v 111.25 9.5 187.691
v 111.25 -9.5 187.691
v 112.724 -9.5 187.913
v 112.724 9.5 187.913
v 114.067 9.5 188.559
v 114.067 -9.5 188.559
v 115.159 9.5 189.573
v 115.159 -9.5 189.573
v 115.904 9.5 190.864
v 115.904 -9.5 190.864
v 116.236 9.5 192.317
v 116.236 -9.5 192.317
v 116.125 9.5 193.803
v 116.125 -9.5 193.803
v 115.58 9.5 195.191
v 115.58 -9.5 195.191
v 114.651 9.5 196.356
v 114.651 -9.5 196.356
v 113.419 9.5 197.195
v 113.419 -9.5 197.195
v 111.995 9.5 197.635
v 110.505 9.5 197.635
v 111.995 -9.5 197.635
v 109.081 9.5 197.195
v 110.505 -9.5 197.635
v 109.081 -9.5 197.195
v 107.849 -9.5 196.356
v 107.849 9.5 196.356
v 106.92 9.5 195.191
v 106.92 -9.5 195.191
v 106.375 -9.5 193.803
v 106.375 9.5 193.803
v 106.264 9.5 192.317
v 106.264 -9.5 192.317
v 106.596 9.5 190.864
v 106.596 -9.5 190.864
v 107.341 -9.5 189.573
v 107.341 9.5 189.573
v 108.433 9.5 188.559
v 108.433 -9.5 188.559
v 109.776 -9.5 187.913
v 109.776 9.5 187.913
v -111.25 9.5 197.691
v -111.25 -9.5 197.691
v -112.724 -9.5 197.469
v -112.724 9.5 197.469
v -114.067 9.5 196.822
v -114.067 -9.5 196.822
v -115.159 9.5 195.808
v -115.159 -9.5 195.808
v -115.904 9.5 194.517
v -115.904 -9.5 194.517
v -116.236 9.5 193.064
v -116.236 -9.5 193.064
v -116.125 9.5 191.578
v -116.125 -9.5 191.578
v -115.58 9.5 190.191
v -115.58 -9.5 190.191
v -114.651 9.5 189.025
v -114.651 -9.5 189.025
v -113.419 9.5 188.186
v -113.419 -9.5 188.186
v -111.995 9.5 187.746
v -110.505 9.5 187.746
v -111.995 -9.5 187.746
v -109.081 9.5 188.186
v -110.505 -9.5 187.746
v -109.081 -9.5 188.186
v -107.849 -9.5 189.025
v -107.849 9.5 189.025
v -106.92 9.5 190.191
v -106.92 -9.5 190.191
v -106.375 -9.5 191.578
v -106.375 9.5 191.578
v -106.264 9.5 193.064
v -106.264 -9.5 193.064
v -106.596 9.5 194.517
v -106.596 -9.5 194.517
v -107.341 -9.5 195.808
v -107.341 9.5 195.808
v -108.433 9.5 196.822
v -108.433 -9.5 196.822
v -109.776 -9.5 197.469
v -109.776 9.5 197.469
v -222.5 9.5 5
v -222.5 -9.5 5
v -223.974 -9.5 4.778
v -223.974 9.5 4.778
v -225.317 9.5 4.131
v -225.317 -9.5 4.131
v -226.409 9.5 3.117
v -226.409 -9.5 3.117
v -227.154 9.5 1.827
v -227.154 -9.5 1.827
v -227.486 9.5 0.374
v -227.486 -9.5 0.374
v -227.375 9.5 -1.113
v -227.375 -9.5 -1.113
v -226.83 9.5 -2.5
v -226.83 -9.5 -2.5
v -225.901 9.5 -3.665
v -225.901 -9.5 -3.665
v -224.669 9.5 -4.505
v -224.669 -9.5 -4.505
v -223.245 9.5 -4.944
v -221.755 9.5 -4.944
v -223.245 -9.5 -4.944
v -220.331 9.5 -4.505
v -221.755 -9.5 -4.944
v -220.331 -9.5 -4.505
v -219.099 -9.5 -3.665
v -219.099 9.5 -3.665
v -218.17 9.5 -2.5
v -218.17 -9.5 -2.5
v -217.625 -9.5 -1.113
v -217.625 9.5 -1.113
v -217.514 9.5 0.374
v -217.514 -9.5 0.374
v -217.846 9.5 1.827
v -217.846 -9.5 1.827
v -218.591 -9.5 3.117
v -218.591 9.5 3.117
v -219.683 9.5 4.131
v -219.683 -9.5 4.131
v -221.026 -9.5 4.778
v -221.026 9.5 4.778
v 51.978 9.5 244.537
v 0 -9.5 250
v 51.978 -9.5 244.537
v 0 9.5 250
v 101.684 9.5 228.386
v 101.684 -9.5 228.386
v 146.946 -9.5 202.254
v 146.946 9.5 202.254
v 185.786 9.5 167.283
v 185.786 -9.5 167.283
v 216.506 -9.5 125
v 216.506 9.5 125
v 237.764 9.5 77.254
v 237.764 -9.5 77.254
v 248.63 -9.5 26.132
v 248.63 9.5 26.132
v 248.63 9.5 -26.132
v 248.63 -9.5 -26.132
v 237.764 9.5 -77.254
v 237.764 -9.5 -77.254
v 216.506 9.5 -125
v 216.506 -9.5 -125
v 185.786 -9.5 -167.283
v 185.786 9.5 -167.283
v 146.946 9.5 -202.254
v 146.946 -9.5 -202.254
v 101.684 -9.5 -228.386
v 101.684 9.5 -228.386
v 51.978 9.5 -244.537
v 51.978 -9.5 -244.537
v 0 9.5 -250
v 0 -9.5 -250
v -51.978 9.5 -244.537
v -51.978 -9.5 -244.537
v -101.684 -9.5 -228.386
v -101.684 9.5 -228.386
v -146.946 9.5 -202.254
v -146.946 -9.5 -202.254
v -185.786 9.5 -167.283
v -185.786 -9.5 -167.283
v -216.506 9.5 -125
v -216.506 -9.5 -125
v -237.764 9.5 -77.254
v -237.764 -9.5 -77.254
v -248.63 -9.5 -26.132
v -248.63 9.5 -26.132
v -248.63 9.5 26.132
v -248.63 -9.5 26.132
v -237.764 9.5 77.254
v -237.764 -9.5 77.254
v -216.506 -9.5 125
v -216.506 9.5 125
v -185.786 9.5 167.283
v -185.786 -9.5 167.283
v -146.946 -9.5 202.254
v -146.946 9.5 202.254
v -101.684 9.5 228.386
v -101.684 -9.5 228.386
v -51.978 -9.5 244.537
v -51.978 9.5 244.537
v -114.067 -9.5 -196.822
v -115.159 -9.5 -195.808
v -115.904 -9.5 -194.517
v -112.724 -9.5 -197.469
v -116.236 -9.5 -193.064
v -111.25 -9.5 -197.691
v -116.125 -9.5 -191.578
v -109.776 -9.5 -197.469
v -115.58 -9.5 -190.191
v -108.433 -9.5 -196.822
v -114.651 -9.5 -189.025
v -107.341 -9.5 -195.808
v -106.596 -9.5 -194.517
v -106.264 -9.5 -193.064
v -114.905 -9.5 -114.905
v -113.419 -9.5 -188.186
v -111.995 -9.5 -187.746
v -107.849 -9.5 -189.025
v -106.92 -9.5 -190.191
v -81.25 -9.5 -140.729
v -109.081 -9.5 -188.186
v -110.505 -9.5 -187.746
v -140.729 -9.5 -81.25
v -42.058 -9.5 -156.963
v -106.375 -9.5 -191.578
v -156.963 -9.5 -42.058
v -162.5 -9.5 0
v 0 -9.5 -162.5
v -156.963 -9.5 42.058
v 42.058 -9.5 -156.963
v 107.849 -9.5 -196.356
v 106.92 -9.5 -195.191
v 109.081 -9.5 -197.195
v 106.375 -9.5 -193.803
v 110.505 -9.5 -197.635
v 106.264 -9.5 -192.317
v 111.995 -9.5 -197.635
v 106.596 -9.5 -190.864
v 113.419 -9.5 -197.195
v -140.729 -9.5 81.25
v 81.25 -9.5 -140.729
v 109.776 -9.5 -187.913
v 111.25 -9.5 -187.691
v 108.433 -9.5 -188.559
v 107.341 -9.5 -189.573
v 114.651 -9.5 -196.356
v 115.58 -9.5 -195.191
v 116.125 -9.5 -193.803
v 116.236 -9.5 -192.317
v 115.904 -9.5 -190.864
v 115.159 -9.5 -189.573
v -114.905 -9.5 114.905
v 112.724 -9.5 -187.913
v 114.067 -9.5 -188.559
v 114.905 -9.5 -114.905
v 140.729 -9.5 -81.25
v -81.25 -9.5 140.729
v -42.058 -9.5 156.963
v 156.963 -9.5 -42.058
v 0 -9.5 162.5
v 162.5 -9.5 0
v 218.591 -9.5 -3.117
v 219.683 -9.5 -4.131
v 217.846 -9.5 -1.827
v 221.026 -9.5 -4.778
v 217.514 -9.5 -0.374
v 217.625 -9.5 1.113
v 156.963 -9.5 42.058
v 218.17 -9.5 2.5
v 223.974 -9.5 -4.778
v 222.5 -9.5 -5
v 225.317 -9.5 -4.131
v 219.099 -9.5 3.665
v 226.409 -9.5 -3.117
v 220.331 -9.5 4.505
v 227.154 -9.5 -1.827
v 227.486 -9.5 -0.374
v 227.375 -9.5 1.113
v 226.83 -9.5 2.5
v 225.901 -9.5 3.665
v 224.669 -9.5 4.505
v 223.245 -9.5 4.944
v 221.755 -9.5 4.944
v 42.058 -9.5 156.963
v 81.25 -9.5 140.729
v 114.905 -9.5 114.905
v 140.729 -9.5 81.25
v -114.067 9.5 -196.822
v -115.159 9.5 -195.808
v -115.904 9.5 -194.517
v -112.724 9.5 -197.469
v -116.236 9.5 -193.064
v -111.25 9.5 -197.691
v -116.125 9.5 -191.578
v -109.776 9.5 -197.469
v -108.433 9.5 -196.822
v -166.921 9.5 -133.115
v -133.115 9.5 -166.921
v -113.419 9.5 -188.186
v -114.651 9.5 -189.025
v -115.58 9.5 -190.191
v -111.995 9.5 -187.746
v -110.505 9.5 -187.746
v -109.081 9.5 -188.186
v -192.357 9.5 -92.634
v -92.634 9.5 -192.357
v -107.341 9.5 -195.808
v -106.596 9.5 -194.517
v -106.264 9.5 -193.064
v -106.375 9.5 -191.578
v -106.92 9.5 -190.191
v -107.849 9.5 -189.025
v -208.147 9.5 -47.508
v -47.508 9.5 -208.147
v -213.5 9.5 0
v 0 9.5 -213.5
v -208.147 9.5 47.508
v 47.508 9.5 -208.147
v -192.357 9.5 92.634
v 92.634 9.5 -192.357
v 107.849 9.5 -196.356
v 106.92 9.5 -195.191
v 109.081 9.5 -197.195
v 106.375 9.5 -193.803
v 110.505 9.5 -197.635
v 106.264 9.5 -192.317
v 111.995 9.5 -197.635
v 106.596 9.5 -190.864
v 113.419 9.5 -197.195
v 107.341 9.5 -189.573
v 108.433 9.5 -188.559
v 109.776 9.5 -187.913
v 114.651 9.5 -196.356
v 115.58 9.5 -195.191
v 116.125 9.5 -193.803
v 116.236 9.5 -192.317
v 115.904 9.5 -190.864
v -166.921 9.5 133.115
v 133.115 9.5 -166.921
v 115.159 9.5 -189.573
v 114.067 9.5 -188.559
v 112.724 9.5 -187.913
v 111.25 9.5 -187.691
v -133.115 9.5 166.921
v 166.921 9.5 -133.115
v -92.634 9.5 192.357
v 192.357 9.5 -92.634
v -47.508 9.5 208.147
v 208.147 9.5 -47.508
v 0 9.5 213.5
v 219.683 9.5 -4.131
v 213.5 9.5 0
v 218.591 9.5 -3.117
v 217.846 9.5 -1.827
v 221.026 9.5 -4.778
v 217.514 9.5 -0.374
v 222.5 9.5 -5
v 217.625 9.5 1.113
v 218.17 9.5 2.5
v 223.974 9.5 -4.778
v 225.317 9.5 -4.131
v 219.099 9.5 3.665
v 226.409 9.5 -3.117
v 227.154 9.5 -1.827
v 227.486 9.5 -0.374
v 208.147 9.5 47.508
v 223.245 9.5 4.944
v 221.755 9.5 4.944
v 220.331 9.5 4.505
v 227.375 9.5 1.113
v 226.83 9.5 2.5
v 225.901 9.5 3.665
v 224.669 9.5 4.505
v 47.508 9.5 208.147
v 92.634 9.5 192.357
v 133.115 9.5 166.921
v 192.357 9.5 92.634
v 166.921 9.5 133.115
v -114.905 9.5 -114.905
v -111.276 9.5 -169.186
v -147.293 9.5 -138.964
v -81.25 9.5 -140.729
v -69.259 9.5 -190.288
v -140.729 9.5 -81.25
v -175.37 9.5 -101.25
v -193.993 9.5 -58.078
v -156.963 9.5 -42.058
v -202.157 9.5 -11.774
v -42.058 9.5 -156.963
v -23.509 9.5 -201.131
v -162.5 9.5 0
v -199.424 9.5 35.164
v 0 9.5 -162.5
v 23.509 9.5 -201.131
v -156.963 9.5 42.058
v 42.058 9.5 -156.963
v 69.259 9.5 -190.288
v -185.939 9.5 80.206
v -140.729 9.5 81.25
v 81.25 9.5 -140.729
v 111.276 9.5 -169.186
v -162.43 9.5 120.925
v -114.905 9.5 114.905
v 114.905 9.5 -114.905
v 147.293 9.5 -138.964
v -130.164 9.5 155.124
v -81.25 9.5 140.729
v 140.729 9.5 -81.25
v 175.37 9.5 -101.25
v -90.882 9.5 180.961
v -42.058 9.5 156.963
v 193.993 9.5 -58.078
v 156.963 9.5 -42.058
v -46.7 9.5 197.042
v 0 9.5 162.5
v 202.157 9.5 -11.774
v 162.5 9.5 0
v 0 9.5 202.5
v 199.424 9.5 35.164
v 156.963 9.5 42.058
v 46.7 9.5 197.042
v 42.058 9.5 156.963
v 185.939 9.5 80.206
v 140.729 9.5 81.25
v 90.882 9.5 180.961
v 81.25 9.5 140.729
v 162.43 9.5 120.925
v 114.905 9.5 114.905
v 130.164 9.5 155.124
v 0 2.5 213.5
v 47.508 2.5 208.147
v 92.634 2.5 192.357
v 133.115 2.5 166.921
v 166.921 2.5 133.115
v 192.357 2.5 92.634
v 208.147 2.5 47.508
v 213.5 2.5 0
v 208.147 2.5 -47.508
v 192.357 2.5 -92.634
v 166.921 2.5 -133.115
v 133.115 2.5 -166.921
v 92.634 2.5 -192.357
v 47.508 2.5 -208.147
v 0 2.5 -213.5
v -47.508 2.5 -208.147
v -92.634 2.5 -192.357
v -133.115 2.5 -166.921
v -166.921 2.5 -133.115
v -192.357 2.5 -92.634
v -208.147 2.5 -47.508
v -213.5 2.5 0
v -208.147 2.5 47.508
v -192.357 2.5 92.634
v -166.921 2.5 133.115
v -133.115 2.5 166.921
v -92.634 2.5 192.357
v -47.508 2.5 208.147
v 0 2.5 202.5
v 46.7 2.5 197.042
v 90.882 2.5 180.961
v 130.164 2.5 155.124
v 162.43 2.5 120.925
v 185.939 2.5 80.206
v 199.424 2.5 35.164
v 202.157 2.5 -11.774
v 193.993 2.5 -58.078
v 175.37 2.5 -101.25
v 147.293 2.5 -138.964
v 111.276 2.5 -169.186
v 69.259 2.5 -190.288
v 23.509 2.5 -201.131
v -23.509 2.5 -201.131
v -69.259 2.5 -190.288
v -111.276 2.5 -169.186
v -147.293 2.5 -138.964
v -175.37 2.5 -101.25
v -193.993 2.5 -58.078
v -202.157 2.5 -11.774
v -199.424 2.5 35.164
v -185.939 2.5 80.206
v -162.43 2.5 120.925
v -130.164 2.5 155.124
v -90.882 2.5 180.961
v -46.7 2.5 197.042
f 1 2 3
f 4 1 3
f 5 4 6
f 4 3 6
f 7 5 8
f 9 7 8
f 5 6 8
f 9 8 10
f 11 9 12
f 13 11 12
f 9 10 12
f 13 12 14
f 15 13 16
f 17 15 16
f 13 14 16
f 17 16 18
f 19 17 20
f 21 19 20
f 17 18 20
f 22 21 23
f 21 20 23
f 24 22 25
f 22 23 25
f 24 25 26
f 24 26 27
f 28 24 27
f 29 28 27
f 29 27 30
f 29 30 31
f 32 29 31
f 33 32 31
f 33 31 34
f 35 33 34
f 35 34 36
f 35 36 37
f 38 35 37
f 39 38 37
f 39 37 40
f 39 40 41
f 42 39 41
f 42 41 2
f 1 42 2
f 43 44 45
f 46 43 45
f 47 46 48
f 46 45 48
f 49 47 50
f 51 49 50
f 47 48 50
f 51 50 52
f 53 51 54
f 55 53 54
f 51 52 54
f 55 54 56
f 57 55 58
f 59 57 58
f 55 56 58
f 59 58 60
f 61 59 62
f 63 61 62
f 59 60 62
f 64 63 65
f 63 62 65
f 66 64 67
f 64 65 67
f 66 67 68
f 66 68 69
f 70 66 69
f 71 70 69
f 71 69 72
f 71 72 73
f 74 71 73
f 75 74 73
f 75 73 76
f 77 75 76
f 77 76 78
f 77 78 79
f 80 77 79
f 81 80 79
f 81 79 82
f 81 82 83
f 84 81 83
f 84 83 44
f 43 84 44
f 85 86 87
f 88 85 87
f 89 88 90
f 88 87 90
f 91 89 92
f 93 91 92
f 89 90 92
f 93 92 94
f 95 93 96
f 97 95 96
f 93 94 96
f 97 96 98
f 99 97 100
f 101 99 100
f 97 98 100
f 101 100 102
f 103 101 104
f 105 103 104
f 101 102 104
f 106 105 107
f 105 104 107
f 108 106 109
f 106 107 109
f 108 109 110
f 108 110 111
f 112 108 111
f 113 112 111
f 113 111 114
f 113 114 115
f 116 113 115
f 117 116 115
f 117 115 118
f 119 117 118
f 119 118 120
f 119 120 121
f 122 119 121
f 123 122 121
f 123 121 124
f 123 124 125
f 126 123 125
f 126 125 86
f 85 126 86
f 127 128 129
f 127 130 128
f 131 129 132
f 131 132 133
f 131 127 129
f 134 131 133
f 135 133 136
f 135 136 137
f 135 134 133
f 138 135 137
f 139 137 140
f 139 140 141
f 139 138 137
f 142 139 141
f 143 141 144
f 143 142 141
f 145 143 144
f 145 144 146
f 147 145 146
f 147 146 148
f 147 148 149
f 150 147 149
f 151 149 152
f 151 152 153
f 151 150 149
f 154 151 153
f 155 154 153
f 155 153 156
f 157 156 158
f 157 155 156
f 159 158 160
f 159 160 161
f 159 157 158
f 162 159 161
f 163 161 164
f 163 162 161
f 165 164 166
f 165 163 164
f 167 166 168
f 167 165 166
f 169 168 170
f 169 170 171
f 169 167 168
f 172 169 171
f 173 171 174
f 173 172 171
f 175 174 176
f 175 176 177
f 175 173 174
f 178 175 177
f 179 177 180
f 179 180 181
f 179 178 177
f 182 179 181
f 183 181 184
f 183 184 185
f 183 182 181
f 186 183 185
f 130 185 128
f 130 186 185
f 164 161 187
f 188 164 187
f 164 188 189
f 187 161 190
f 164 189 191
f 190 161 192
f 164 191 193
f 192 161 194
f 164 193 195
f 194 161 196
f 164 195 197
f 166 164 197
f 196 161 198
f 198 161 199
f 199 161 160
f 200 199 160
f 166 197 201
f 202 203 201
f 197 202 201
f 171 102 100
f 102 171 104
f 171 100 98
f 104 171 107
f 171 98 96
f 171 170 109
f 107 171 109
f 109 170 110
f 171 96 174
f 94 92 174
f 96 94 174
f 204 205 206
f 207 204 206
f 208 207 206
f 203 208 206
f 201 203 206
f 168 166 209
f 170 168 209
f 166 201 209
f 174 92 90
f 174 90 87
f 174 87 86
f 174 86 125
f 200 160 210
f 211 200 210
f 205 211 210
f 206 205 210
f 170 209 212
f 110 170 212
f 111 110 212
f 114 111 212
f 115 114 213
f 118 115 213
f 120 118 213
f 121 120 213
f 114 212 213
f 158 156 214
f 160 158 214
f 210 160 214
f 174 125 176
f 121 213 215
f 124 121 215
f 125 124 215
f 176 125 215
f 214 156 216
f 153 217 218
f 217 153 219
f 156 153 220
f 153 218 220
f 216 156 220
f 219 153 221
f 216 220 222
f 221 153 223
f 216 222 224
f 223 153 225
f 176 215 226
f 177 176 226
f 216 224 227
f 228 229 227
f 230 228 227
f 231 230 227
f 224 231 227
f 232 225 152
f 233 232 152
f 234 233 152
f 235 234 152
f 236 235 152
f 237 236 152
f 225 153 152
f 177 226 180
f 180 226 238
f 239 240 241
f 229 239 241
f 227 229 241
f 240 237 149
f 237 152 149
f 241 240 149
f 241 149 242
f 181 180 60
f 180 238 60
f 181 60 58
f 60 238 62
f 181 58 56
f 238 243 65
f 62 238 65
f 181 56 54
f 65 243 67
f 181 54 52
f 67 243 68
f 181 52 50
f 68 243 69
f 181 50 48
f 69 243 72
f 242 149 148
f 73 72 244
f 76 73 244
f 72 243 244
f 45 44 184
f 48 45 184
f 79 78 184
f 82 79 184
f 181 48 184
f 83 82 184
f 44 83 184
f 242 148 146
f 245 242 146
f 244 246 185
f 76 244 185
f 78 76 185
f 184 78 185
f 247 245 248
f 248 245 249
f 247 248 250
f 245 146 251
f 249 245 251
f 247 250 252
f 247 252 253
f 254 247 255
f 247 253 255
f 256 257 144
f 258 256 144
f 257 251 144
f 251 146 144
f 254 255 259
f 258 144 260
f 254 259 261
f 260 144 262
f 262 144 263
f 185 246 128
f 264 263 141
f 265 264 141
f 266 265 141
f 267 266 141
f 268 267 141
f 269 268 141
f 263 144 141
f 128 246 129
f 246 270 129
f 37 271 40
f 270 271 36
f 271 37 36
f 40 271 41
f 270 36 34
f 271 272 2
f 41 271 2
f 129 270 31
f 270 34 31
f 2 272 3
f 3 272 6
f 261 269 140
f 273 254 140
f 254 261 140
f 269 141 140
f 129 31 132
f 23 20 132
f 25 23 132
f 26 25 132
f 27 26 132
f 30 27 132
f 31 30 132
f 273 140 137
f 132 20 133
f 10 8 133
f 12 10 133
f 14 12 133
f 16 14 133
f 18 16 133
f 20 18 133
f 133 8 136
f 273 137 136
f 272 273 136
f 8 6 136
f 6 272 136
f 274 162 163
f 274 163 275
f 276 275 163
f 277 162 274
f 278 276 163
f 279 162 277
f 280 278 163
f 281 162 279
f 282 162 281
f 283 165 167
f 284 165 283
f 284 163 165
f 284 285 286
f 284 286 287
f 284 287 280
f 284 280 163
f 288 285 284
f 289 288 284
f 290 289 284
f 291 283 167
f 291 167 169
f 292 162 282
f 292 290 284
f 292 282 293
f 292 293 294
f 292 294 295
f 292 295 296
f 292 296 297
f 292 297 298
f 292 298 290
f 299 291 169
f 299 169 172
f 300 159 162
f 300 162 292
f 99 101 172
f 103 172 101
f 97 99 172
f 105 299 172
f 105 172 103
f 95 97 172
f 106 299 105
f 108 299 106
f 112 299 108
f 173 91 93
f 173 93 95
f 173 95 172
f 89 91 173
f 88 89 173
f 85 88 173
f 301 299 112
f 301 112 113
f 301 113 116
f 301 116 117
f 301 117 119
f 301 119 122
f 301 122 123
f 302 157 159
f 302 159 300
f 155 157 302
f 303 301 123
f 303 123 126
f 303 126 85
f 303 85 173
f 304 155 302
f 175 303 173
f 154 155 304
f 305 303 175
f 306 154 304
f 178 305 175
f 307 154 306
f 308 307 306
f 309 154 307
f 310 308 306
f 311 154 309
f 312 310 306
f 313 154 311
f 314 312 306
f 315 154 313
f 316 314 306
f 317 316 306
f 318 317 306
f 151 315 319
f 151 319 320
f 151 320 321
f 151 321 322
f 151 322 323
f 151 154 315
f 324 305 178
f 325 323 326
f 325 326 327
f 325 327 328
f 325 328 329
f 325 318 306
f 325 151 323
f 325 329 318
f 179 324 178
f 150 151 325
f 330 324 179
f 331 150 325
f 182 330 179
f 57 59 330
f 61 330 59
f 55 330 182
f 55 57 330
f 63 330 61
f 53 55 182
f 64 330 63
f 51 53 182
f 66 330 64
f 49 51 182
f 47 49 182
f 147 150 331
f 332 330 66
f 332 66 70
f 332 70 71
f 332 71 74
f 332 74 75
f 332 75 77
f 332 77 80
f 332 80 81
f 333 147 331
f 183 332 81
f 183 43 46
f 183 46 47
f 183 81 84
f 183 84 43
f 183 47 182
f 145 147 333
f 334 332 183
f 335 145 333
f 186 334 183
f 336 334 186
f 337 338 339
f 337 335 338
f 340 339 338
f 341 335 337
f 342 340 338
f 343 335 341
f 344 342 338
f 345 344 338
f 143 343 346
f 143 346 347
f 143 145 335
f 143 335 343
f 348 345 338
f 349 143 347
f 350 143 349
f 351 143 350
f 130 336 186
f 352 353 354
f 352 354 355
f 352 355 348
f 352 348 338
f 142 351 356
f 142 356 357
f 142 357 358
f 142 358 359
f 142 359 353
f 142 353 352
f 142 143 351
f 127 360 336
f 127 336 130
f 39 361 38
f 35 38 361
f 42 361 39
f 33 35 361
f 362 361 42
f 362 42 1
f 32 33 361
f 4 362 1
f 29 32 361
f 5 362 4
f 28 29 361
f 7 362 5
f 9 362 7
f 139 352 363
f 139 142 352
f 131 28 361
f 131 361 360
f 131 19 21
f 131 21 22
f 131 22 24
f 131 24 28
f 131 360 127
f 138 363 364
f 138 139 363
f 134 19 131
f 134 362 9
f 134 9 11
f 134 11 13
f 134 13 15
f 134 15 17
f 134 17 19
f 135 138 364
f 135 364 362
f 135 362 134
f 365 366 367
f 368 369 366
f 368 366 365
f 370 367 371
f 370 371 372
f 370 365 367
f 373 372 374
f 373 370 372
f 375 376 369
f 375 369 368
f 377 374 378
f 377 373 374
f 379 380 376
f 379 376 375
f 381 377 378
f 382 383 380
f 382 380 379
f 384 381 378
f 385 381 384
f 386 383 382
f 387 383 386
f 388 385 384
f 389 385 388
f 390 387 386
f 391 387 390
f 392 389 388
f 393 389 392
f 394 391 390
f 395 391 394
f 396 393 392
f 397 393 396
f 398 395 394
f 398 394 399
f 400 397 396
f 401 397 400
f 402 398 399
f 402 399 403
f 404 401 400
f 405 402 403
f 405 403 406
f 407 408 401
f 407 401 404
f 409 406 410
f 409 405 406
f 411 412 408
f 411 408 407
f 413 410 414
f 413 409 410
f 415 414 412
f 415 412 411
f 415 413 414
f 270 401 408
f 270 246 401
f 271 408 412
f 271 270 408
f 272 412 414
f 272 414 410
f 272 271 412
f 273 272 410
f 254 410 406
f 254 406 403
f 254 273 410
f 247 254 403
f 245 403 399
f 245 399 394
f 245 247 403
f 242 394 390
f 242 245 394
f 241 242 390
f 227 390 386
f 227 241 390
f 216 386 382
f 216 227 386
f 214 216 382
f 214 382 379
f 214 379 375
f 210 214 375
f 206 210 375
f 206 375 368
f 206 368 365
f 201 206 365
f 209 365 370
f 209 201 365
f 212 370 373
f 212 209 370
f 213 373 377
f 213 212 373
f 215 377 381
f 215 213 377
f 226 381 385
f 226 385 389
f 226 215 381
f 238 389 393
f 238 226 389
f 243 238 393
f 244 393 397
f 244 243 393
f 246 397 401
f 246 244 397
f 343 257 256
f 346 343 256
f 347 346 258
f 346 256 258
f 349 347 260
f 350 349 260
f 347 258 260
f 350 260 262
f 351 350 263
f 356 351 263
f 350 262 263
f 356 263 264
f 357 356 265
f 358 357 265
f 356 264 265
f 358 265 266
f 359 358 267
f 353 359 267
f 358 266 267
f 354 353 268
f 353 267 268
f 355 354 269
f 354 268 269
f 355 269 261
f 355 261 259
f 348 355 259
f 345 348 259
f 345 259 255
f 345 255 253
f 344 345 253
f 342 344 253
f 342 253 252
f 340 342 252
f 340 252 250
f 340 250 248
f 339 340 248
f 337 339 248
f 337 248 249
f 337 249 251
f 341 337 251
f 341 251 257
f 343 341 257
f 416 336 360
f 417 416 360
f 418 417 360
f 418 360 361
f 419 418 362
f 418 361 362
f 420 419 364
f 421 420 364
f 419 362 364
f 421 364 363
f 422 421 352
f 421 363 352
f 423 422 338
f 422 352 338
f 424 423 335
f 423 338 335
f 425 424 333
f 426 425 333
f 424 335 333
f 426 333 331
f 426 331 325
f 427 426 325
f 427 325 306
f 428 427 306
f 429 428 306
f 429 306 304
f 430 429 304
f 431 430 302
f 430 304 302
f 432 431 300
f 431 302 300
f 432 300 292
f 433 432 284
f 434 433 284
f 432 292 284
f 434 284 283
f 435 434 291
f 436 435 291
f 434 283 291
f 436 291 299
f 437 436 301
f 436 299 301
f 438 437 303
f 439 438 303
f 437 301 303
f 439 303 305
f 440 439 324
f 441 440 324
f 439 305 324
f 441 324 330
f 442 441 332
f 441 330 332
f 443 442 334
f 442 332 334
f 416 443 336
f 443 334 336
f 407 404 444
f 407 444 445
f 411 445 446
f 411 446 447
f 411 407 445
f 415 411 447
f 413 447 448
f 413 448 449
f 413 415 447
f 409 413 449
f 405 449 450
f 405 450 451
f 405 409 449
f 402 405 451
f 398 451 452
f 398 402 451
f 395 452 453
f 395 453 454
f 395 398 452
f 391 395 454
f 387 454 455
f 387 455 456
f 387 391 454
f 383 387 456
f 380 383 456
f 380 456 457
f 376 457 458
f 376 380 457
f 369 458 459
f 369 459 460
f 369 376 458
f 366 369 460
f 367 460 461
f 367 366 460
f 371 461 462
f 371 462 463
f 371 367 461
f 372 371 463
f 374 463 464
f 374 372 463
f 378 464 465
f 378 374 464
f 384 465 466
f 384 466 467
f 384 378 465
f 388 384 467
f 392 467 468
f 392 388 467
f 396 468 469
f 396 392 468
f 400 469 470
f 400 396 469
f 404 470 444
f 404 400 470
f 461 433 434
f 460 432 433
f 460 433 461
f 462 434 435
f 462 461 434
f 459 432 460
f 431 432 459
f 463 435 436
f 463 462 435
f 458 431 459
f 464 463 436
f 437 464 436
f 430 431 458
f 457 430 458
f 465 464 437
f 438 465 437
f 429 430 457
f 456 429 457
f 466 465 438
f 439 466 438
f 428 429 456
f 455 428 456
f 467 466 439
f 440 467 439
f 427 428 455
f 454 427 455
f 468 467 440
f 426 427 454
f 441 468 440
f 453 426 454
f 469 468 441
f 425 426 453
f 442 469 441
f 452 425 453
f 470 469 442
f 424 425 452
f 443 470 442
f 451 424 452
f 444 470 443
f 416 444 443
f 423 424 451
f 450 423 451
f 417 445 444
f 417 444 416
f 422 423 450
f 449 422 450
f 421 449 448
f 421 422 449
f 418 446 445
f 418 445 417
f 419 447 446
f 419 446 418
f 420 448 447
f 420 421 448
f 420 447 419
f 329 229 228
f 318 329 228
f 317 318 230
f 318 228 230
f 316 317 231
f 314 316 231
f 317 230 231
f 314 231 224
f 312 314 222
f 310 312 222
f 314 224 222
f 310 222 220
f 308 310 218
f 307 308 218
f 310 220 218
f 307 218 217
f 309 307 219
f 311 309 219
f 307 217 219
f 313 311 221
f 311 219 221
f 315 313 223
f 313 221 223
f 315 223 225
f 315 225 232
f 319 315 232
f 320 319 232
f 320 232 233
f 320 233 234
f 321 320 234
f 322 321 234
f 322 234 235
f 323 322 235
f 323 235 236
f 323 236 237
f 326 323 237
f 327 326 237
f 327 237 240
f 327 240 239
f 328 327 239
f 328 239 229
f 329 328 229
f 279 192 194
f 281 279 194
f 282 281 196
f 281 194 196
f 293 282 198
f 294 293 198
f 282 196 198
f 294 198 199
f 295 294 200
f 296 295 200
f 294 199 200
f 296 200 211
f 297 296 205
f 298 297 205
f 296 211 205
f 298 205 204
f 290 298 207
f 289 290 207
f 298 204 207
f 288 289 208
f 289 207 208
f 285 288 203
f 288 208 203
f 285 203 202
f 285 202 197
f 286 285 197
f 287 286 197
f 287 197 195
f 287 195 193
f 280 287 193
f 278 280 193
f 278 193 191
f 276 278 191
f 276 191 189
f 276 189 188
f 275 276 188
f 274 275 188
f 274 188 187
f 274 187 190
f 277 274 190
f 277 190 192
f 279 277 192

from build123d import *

# Parameters (mm, degrees)
SKETCH1_R           = 250
SKETCH1_R_2         = 162.5
BOSS_EXTRUDE1_DEPTH = 9.5
SKETCH2_R           = 213.5
SKETCH2_R_2         = 202.5
CUT_EXTRUDE1_DEPTH  = 7
SKETCH3_R           = 5
CUT_EXTRUDE2_DEPTH  = 355.063553617


with BuildPart() as part:
    # Sketch1 → Boss-Extrude1 (new, symmetric)
    with BuildSketch(Plane(origin=(0, 0, 0), x_dir=(1, 0, 0), z_dir=(0, 1, 0))):
        with Locations(Location((0, 0, 0), (0, 0, 270))):
            Circle(SKETCH1_R)
        with Locations(Location((0, 0, 0), (0, 0, 270))):
            Circle(SKETCH1_R_2, mode=Mode.SUBTRACT)
    extrude(amount=BOSS_EXTRUDE1_DEPTH, both=True)

    # Sketch2 → Cut-Extrude1 (cut)
    with BuildSketch(Plane(origin=(0, 9.5, 0), x_dir=(1, 0, 0), z_dir=(0, 1, 0))):
        with Locations(Location((0, 0, 0), (0, 0, 270))):
            Circle(SKETCH2_R)
        with Locations(Location((0, 0, 0), (0, 0, 270))):
            Circle(SKETCH2_R_2, mode=Mode.SUBTRACT)
    extrude(amount=-CUT_EXTRUDE1_DEPTH, mode=Mode.SUBTRACT)

    # Sketch3 → Cut-Extrude2 (cut, through all)
    with BuildSketch(Plane.XZ.offset(9.5)):
        with Locations(Location((111.25, 192.690652342, 0), (0, 0, 270))):
            Circle(SKETCH3_R)
        with Locations(Location((222.5, 0, 0), (0, 0, 270))):
            Circle(SKETCH3_R)
        with Locations(Location((-222.5, 0, 0), (0, 0, 90))):
            Circle(SKETCH3_R)
        with Locations(Location((-111.25, 192.690652342, 0), (0, 0, 90))):
            Circle(SKETCH3_R)
        with Locations(Location((-111.25, -192.690652342, 0), (0, 0, 270))):
            Circle(SKETCH3_R)
        with Locations(Location((111.25, -192.690652342, 0), (0, 0, 90))):
            Circle(SKETCH3_R)
    extrude(amount=-CUT_EXTRUDE2_DEPTH, mode=Mode.SUBTRACT)


solid = part.part
